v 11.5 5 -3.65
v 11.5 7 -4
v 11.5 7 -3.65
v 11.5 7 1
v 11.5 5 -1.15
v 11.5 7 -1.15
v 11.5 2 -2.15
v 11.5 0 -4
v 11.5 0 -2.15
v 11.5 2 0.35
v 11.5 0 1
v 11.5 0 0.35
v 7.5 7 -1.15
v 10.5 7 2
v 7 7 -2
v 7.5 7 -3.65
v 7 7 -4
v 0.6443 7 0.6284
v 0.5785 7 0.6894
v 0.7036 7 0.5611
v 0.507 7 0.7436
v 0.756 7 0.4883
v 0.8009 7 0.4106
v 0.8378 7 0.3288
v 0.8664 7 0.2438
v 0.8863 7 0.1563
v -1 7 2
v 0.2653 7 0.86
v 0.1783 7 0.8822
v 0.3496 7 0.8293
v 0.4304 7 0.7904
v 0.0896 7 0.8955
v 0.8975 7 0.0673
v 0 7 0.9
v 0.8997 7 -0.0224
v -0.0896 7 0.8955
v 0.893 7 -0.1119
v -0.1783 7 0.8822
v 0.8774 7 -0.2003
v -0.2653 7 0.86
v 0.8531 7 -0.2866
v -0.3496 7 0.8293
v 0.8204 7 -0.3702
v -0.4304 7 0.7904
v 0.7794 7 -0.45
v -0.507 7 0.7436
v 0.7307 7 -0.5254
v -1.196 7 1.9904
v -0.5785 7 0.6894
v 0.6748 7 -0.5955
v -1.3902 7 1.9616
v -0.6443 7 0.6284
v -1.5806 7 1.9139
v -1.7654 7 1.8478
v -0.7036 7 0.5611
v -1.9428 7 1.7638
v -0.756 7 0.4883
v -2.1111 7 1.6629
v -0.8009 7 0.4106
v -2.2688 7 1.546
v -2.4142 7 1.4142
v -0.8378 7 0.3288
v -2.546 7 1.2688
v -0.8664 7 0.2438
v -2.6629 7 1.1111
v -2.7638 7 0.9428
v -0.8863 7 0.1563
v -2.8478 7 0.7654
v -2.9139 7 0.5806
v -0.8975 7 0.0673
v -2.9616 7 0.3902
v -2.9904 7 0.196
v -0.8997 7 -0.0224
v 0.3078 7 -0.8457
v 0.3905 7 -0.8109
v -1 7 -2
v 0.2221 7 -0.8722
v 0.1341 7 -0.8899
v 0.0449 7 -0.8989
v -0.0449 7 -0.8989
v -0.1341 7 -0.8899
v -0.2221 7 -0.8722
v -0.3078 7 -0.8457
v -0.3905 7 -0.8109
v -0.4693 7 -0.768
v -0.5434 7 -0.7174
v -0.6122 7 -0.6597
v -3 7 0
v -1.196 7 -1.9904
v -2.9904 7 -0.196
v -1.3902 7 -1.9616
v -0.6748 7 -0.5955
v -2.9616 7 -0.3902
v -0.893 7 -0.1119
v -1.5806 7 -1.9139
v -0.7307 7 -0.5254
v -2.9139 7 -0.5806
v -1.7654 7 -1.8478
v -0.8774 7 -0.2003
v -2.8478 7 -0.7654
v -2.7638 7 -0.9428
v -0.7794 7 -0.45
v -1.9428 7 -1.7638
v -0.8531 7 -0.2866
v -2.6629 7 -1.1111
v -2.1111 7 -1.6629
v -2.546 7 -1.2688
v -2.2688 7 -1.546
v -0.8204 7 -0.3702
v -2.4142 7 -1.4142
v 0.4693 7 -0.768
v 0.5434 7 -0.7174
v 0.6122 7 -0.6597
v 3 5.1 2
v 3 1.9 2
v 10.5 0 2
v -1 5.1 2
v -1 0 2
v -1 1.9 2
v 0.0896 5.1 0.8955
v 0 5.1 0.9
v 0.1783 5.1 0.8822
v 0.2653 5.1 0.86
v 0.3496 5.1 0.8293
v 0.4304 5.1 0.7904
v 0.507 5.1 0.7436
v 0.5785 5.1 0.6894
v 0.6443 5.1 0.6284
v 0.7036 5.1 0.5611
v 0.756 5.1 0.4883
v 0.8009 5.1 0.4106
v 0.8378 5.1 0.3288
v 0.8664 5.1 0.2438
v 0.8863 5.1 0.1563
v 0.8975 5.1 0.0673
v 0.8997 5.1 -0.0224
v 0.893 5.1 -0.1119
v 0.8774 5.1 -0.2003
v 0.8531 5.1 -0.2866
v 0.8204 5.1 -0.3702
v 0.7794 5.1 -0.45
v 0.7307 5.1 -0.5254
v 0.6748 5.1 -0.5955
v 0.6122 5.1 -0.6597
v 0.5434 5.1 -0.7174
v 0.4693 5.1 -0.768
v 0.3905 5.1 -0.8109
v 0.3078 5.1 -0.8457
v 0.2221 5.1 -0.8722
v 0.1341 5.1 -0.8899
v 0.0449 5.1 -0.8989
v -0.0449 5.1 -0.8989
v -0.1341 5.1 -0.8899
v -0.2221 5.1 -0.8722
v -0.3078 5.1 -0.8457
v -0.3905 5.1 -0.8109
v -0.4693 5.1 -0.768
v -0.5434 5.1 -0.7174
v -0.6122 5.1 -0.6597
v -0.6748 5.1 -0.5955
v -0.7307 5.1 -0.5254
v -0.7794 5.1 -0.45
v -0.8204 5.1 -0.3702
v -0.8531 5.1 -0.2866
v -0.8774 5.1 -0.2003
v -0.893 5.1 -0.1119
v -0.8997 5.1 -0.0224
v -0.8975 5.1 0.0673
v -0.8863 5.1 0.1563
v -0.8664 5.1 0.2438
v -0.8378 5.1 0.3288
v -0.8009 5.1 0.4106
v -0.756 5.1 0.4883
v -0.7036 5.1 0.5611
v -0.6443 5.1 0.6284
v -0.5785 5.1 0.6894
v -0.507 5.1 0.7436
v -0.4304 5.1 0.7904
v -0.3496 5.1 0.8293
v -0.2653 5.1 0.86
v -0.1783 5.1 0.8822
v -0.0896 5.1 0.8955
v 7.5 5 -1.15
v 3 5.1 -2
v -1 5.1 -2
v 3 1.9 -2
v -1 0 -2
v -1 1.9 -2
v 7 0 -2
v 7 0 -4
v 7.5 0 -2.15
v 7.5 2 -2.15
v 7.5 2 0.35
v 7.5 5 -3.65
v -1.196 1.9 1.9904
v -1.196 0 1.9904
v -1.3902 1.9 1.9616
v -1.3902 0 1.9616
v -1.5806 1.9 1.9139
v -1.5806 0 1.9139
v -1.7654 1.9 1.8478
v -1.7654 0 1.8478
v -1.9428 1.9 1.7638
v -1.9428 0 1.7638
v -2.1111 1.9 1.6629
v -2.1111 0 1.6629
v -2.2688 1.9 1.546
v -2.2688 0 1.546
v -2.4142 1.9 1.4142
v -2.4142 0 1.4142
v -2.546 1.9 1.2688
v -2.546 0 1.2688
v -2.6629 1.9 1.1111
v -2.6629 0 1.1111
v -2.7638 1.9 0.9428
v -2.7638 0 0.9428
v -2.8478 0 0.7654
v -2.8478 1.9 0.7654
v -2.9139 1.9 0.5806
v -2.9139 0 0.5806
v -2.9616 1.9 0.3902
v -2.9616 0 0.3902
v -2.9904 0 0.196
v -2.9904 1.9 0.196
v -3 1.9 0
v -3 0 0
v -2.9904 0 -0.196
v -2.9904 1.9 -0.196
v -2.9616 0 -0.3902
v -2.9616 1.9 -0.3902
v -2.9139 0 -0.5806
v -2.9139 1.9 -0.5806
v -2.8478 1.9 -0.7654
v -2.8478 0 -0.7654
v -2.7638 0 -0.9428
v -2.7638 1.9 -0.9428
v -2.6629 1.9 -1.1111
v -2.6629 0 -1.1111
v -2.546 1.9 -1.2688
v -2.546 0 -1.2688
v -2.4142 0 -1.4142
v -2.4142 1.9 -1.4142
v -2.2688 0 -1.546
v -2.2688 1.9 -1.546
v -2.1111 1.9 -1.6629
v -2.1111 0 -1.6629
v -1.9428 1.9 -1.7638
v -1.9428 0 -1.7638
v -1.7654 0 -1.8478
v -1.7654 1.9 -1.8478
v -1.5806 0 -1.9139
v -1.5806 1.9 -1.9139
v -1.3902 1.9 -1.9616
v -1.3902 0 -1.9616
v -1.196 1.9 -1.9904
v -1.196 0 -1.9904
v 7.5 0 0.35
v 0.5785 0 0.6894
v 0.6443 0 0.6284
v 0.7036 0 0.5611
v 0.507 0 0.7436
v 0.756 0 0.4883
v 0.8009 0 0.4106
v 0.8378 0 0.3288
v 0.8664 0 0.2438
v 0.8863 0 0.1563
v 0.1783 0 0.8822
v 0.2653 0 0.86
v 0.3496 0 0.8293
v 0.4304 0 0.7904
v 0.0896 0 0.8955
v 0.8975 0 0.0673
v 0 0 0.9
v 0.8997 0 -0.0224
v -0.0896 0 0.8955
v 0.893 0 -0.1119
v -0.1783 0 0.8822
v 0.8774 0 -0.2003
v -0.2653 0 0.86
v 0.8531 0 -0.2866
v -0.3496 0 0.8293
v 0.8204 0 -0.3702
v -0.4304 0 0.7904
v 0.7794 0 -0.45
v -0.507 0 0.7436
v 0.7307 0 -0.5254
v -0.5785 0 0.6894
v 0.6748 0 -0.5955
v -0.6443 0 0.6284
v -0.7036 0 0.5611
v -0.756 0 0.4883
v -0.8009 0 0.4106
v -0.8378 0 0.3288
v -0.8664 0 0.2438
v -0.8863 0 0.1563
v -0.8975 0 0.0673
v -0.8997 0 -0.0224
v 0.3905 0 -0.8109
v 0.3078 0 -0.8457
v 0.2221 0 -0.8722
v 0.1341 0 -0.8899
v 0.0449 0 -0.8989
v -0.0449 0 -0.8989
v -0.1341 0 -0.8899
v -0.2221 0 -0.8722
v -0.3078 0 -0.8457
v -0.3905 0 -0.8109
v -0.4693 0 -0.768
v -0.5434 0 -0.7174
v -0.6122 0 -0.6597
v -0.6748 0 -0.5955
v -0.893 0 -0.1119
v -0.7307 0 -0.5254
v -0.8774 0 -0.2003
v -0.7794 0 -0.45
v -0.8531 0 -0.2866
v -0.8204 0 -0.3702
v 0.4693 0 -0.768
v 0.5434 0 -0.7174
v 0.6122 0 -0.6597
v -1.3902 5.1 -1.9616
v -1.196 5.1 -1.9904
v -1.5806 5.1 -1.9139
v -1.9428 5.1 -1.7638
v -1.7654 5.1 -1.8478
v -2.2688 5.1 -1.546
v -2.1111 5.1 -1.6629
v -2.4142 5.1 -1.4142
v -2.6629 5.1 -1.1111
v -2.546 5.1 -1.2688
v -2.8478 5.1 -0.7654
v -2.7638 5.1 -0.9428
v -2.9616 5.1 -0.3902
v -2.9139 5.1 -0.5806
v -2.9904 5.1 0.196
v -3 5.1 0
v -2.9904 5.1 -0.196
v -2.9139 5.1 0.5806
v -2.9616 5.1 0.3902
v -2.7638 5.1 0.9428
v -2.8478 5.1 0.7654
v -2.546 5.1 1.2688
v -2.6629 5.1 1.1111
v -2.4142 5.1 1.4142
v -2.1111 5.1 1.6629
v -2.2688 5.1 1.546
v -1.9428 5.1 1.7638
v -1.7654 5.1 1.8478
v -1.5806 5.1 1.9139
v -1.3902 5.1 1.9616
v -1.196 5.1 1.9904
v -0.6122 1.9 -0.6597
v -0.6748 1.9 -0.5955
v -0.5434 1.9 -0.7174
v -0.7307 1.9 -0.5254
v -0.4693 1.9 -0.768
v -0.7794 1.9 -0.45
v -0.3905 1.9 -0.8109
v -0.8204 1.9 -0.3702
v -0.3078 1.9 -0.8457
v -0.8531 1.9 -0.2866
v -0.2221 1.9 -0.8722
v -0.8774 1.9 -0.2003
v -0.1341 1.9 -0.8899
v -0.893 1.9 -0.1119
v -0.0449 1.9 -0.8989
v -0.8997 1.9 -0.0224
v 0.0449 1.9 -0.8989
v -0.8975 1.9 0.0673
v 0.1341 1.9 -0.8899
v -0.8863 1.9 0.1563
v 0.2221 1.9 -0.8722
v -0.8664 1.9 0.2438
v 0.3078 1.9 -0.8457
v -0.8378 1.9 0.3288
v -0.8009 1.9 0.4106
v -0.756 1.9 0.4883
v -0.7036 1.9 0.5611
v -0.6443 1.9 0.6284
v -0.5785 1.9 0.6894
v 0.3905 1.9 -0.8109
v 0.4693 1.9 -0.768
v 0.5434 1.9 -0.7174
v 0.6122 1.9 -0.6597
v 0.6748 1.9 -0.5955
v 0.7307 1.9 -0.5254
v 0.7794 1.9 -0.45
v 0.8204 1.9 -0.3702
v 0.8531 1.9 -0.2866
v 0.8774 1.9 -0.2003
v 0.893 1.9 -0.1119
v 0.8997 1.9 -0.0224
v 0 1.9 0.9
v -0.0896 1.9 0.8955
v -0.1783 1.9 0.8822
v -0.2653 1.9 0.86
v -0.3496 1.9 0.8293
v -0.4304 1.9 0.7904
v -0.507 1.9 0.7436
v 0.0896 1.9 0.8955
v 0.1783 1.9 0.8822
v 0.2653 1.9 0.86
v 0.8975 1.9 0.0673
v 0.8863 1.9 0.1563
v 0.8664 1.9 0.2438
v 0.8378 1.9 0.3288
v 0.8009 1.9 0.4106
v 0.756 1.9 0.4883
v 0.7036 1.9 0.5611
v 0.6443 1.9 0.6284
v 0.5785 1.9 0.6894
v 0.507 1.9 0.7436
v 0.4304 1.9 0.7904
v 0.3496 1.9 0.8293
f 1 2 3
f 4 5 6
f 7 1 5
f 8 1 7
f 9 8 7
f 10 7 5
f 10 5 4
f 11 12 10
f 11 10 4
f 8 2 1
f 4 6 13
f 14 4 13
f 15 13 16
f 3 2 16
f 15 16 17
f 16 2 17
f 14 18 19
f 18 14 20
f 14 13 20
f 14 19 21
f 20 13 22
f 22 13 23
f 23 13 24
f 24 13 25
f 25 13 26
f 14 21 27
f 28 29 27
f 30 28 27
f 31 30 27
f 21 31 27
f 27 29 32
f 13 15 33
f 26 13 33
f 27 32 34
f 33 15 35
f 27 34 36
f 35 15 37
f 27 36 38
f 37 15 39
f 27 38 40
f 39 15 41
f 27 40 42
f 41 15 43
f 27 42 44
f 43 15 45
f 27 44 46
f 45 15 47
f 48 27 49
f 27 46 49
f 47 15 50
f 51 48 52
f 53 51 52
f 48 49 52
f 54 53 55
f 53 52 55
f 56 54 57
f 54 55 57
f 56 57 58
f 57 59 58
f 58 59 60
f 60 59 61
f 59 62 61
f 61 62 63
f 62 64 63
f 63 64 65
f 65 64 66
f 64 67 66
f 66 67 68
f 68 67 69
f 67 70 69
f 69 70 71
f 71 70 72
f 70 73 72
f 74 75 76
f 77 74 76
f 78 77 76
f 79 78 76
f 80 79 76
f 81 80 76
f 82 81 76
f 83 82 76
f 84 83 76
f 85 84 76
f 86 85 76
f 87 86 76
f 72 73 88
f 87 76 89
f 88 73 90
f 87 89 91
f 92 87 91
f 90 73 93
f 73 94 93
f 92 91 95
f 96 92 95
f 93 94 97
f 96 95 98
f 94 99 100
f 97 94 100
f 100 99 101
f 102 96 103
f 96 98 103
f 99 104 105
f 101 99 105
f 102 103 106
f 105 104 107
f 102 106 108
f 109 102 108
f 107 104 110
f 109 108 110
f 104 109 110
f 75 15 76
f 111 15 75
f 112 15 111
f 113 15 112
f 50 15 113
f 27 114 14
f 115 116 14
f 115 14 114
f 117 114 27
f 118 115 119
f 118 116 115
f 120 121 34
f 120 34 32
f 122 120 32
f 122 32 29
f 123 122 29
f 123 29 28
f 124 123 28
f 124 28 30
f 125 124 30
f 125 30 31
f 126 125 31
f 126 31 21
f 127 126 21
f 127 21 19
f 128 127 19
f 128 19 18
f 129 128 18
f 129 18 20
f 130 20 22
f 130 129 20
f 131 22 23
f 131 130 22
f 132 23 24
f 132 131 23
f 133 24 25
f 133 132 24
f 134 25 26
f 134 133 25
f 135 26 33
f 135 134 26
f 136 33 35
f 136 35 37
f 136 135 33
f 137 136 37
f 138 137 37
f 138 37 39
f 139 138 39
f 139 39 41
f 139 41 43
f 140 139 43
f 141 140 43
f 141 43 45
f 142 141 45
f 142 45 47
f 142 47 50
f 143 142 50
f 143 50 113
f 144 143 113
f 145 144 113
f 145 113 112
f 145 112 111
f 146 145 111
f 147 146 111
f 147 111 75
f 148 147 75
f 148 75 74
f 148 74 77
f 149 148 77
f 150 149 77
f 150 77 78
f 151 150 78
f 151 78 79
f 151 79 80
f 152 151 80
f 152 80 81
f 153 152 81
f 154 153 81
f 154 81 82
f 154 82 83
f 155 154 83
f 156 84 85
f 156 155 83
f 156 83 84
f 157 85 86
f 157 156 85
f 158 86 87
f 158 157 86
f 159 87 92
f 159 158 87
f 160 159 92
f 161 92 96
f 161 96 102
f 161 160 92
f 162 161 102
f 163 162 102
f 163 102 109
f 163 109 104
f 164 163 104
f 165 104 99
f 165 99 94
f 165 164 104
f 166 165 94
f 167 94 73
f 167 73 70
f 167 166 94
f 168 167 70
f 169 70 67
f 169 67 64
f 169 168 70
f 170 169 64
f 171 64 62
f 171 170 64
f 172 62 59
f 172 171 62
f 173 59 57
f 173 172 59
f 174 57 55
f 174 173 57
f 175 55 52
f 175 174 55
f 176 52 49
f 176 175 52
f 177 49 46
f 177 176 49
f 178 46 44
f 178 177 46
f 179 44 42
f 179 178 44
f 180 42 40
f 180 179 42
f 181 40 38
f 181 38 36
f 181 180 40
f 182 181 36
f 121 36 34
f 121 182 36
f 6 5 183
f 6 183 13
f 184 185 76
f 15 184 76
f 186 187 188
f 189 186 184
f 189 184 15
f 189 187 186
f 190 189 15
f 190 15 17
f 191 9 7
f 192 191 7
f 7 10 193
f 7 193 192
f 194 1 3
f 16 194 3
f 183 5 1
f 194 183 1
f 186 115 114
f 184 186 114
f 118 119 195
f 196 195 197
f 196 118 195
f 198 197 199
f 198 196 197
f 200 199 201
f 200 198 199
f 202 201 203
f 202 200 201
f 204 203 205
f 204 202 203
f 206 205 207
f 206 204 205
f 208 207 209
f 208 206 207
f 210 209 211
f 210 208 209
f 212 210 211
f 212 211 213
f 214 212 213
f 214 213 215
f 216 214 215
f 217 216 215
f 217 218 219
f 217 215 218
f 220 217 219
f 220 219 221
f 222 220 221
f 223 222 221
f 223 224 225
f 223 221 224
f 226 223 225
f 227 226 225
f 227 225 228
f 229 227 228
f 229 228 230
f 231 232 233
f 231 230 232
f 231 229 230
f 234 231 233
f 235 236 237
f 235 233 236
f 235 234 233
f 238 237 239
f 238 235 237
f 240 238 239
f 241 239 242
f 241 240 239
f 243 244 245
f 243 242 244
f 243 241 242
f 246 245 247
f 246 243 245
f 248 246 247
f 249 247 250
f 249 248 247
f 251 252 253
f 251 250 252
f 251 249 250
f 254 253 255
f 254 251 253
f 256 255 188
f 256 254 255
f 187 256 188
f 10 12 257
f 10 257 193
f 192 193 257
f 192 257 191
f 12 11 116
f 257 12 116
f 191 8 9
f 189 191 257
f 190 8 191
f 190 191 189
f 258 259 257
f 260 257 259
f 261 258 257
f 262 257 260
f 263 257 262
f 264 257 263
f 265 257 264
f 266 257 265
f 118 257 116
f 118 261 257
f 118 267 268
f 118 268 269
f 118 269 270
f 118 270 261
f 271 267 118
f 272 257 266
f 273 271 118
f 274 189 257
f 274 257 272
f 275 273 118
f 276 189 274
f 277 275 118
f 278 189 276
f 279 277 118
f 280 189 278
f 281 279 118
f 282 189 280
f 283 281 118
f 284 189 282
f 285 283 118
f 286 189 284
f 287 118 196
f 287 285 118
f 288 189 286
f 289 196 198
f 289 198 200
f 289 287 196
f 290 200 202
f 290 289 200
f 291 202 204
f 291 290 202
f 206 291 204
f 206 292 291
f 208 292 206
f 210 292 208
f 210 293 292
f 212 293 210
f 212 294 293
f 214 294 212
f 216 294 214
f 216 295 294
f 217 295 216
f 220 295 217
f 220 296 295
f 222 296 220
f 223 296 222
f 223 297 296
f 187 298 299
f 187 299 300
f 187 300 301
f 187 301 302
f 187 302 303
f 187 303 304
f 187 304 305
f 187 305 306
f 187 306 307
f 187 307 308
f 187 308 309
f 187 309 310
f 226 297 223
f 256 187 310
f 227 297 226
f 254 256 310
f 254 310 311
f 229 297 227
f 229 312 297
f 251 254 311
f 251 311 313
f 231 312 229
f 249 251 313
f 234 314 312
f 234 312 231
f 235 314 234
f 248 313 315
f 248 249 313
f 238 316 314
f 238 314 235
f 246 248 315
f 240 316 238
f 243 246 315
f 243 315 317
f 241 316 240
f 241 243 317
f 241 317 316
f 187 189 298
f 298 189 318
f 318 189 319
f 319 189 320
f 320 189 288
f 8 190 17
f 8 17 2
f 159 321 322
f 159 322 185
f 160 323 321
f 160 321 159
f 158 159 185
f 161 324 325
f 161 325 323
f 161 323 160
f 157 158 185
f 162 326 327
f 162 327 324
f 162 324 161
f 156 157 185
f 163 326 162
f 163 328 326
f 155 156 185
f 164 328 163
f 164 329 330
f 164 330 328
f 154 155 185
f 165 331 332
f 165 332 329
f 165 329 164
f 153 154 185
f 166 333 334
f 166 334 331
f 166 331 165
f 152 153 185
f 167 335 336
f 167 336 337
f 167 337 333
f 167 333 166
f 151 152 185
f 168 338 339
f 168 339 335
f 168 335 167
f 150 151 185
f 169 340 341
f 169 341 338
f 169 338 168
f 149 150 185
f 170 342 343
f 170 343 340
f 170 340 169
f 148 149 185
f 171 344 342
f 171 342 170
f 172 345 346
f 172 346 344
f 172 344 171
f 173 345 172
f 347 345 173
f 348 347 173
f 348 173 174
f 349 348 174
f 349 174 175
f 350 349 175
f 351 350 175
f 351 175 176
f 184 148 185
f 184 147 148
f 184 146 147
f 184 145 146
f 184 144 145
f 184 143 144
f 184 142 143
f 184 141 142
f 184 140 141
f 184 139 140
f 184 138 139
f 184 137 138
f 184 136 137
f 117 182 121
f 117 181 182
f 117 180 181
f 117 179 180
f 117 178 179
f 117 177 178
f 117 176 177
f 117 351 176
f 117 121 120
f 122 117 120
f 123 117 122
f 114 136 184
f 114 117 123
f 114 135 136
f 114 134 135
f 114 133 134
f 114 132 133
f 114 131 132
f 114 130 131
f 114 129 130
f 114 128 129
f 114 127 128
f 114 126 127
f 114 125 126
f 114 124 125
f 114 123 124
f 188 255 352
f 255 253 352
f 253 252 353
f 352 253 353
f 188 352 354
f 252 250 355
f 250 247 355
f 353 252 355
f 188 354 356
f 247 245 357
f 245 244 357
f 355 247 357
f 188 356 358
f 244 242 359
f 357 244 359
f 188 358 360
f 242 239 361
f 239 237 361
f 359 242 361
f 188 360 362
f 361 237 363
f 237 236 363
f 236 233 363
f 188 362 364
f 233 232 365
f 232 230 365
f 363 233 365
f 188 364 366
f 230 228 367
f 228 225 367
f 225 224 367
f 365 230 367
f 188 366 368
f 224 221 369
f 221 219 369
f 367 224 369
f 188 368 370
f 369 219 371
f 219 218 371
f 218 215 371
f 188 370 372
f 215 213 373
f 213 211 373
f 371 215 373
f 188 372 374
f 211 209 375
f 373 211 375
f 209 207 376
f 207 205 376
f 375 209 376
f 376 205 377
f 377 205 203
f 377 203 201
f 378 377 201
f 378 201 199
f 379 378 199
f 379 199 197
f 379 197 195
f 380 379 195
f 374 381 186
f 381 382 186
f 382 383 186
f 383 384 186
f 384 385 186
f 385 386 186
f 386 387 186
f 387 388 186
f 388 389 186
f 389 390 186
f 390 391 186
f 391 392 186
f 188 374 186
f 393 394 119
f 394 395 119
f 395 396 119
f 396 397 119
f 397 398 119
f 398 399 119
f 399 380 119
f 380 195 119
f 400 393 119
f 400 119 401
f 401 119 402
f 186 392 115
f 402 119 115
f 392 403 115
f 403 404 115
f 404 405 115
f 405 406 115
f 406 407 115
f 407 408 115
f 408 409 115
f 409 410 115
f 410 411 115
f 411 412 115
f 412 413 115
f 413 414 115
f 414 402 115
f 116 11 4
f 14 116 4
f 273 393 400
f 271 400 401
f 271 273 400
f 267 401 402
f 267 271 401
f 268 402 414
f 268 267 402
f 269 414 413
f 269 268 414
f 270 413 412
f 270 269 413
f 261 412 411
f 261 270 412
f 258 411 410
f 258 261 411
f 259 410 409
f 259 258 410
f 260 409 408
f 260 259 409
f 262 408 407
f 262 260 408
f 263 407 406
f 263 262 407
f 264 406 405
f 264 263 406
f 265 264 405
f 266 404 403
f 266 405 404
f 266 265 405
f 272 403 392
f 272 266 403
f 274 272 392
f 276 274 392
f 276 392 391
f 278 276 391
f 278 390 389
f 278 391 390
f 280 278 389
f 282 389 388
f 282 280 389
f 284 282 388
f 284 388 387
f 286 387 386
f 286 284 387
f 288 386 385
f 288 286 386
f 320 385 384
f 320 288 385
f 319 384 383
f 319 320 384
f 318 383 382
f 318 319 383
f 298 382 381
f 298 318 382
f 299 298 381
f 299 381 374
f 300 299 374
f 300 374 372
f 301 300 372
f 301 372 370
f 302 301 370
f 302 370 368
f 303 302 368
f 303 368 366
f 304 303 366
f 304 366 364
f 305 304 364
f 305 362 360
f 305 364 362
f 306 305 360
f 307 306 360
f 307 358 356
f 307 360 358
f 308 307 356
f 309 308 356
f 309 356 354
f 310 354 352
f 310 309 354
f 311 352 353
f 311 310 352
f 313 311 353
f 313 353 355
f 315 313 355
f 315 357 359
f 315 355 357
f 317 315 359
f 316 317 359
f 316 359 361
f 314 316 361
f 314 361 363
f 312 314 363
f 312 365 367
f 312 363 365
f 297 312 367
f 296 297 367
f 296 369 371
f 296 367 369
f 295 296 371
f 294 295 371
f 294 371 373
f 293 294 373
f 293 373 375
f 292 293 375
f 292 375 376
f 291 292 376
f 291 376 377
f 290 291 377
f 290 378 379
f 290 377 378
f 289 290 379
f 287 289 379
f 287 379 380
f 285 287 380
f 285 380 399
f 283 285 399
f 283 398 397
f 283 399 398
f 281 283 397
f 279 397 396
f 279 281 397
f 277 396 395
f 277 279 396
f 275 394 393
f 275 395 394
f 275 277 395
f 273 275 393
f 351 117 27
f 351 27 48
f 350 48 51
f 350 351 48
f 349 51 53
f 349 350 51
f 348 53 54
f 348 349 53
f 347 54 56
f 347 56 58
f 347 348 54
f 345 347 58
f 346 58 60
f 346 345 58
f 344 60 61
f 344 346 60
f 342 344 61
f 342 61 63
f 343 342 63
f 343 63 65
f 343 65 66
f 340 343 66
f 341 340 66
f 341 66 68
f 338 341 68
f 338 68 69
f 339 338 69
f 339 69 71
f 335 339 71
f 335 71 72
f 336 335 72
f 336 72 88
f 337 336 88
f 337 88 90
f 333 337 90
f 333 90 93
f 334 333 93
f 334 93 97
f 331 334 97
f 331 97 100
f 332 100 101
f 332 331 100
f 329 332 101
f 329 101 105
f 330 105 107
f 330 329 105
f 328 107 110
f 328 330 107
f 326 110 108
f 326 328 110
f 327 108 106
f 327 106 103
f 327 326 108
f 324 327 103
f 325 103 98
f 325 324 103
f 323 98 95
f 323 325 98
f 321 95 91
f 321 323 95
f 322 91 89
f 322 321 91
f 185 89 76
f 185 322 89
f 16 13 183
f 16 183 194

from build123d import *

# Parameters (mm, degrees)
SKETCH1_R           = 0.9
BOSS_EXTRUDE1_DEPTH = 7
CUT_EXTRUDE1_REACH  = 16.739
SKETCH2_W           = 6
SKETCH2_H           = 3.2
SKETCH3_W           = 2.5
SKETCH3_H           = 2
CUT_EXTRUDE2_DEPTH  = 4
CHAMFER1_SIZE       = 1


with BuildPart() as part:
    # Sketch1 → Boss-Extrude1 (new body)
    with BuildSketch(Plane(origin=(0, 0, 0), x_dir=(1, 0, 0), z_dir=(0, 1, 0))):
        with BuildLine():
            Line((-1, 2), (7, 2))
            Line((7, 2), (7, 4))
            Line((7, 4), (11.5, 4))
            Line((11.5, 4), (11.5, 2))
            Line((11.5, 2), (11.5, -2))
            Line((11.5, -2), (-1, -2))
            ThreePointArc((-1, -2), (-3, 0), (-1, 2))
        make_face()
        with Locations(Location((0, 0, 0), (0, 0, 270))):
            Circle(SKETCH1_R, mode=Mode.SUBTRACT)
    extrude(amount=BOSS_EXTRUDE1_DEPTH)

    # Sketch2 → Cut-Extrude1 (cut, up to next)
    with BuildSketch(Plane.XY.offset(2), mode=Mode.PRIVATE) as cut_extrude1_sk1:
        with Locations((0, 3.5)):
            Rectangle(SKETCH2_W, SKETCH2_H)
    cut_extrude1_tool1 = extrude(cut_extrude1_sk1.sketch, amount=-CUT_EXTRUDE1_REACH, mode=Mode.PRIVATE) & part.part
    add(cut_extrude1_tool1.solids().sort_by_distance((0, 3.5, 2))[0], mode=Mode.SUBTRACT)

    # Sketch3 → Cut-Extrude2 (cut)
    with BuildSketch(Plane(origin=(11.5, 0, 0), x_dir=(0, 0, -1), z_dir=(1, 0, 0))):
        with Locations((2.4, 6)):
            Rectangle(SKETCH3_W, SKETCH3_H)
        with Locations((0.9, 1)):
            Rectangle(SKETCH3_W, SKETCH3_H)
    extrude(amount=-CUT_EXTRUDE2_DEPTH, mode=Mode.SUBTRACT)

    # Chamfer1
    chamfer1_edges = [part.edges().sort_by_distance(p)[0] for p in [
        (11.5, 3.5, 2),
    ]]
    chamfer(chamfer1_edges, length=CHAMFER1_SIZE)


solid = part.part
